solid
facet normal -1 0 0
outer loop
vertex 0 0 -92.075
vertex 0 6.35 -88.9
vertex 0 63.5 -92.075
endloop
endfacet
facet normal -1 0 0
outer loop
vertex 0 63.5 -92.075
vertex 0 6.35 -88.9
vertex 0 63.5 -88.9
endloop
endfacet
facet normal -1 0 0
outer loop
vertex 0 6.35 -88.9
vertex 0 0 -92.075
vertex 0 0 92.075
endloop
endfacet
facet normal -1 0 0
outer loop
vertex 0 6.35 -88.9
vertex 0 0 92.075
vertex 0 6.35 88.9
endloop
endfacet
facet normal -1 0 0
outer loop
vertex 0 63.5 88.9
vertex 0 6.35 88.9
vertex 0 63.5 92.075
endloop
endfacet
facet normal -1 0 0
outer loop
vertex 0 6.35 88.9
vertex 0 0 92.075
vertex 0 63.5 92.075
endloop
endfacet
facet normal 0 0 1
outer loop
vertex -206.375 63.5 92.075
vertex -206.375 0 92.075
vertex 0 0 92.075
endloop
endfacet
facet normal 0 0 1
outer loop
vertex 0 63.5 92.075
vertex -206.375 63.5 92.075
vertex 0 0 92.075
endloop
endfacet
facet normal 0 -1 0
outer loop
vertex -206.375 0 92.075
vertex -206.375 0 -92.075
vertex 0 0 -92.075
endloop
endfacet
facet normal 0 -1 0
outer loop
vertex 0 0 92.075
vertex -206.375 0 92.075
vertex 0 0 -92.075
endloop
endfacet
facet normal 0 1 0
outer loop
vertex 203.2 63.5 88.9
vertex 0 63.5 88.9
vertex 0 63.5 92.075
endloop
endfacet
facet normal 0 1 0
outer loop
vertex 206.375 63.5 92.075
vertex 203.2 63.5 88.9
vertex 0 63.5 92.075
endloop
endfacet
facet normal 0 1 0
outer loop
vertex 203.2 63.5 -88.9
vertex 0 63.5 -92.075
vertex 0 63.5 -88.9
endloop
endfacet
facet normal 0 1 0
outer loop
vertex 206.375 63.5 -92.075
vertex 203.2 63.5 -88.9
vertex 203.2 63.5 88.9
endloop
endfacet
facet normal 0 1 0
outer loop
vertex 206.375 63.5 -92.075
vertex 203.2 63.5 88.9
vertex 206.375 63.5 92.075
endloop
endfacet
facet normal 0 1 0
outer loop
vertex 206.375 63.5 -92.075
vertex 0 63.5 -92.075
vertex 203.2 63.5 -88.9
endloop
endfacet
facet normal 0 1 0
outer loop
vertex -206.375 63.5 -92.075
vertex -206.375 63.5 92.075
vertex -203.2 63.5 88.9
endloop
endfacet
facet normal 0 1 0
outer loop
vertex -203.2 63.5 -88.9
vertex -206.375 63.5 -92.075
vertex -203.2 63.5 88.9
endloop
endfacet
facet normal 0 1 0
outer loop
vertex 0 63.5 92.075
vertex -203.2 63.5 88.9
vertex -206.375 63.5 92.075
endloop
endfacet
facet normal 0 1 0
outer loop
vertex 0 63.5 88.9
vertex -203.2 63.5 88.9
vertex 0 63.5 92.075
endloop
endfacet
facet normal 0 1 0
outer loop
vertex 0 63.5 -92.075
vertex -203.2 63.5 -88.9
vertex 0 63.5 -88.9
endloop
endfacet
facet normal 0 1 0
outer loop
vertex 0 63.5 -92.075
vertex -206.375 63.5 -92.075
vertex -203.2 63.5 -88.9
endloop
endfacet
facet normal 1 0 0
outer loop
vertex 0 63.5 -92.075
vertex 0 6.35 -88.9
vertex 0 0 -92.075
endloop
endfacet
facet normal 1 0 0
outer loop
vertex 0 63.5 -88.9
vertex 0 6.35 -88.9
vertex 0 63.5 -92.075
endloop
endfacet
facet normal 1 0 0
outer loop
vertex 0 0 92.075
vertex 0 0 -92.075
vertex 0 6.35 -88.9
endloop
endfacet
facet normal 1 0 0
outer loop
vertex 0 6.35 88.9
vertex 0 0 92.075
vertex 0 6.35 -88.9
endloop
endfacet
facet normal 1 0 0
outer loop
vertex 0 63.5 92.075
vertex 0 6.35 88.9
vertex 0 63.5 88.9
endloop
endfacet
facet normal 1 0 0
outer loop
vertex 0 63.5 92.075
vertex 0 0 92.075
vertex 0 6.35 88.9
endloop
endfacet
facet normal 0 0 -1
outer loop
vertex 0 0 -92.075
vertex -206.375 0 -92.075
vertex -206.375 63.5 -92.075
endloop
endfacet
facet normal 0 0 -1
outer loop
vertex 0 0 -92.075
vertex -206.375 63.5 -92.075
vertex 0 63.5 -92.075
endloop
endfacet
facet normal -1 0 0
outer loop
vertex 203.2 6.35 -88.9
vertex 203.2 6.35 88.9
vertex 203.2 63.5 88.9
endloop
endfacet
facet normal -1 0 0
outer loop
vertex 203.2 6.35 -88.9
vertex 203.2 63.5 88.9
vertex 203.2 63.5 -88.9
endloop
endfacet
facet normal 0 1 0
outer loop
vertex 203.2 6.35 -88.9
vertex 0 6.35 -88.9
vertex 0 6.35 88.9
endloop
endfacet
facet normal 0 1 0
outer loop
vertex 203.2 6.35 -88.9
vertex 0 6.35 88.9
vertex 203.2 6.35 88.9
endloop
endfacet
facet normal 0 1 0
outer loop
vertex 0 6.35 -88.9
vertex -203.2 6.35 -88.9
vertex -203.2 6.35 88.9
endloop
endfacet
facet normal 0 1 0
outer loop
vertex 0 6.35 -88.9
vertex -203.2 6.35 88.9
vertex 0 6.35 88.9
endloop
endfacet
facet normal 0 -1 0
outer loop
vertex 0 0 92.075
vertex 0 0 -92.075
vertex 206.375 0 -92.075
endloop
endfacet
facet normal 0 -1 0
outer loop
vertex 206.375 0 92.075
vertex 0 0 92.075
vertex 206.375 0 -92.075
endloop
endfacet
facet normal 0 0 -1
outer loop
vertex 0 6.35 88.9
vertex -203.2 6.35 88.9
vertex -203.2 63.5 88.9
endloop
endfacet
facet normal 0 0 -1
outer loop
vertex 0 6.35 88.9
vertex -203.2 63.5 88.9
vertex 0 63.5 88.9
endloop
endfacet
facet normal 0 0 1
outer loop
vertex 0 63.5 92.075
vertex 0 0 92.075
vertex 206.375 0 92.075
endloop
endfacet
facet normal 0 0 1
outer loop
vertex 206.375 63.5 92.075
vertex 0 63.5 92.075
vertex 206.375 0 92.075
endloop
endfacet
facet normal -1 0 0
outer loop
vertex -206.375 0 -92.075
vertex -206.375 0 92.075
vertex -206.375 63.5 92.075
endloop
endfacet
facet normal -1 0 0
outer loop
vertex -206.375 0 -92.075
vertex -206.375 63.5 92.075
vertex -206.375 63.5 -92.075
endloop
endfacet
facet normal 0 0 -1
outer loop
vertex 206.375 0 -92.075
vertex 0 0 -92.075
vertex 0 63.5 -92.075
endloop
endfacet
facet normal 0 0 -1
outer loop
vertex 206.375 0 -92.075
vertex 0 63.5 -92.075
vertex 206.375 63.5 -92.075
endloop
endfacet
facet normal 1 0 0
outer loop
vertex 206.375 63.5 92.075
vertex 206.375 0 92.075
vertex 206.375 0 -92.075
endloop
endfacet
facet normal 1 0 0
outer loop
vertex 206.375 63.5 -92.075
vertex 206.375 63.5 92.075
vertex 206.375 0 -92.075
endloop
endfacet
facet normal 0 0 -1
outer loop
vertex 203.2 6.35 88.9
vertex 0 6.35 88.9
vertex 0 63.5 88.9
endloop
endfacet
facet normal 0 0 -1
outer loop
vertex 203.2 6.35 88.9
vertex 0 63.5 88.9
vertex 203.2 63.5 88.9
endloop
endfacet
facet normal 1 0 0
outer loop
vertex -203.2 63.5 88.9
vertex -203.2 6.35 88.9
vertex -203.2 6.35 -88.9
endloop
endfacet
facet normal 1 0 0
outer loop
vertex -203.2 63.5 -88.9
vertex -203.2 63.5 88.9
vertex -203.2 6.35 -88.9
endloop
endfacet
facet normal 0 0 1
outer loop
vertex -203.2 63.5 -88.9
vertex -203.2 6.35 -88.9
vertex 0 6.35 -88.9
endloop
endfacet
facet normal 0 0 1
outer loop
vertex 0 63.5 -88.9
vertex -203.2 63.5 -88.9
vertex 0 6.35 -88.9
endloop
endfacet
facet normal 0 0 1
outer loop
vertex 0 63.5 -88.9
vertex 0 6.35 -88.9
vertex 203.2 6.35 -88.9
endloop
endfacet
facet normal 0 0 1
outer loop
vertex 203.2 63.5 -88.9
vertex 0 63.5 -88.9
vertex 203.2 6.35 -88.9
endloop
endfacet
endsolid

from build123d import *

# Parameters (mm, degrees)
SKETCH1_W           = 412.75
SKETCH1_H           = 184.15
SKETCH1_W_2         = 406.4
SKETCH1_H_2         = 177.8
BOSS_EXTRUDE2_DEPTH = 63.5
SKETCH2_W           = 406.4
SKETCH2_H           = 177.8
BOSS_EXTRUDE4_DEPTH = 6.35


with BuildPart() as part:
    # Sketch1 → Boss-Extrude2 (new body)
    with BuildSketch(Plane(origin=(0, 0, 0), x_dir=(1, 0, 0), z_dir=(0, 1, 0))):
        Rectangle(SKETCH1_W, SKETCH1_H)
        Rectangle(SKETCH1_W_2, SKETCH1_H_2, mode=Mode.SUBTRACT)
    extrude(amount=BOSS_EXTRUDE2_DEPTH)

    # Sketch2 → Boss-Extrude4 (add)
    with BuildSketch(Plane(origin=(0, 0, 0), x_dir=(1, 0, 0), z_dir=(0, 1, 0))):
        Rectangle(SKETCH2_W, SKETCH2_H)
    extrude(amount=BOSS_EXTRUDE4_DEPTH)


with BuildPart() as body_2:
    # Split1: the piece on the far side of the plane
    add(part.part)
    split(bisect_by=Plane.YZ, keep=Keep.BOTTOM)


with BuildPart() as part_1:
    add(part.part)

    # Split1
    split(bisect_by=Plane.YZ, keep=Keep.TOP)


solid = Compound([body_2.part, part_1.part])
